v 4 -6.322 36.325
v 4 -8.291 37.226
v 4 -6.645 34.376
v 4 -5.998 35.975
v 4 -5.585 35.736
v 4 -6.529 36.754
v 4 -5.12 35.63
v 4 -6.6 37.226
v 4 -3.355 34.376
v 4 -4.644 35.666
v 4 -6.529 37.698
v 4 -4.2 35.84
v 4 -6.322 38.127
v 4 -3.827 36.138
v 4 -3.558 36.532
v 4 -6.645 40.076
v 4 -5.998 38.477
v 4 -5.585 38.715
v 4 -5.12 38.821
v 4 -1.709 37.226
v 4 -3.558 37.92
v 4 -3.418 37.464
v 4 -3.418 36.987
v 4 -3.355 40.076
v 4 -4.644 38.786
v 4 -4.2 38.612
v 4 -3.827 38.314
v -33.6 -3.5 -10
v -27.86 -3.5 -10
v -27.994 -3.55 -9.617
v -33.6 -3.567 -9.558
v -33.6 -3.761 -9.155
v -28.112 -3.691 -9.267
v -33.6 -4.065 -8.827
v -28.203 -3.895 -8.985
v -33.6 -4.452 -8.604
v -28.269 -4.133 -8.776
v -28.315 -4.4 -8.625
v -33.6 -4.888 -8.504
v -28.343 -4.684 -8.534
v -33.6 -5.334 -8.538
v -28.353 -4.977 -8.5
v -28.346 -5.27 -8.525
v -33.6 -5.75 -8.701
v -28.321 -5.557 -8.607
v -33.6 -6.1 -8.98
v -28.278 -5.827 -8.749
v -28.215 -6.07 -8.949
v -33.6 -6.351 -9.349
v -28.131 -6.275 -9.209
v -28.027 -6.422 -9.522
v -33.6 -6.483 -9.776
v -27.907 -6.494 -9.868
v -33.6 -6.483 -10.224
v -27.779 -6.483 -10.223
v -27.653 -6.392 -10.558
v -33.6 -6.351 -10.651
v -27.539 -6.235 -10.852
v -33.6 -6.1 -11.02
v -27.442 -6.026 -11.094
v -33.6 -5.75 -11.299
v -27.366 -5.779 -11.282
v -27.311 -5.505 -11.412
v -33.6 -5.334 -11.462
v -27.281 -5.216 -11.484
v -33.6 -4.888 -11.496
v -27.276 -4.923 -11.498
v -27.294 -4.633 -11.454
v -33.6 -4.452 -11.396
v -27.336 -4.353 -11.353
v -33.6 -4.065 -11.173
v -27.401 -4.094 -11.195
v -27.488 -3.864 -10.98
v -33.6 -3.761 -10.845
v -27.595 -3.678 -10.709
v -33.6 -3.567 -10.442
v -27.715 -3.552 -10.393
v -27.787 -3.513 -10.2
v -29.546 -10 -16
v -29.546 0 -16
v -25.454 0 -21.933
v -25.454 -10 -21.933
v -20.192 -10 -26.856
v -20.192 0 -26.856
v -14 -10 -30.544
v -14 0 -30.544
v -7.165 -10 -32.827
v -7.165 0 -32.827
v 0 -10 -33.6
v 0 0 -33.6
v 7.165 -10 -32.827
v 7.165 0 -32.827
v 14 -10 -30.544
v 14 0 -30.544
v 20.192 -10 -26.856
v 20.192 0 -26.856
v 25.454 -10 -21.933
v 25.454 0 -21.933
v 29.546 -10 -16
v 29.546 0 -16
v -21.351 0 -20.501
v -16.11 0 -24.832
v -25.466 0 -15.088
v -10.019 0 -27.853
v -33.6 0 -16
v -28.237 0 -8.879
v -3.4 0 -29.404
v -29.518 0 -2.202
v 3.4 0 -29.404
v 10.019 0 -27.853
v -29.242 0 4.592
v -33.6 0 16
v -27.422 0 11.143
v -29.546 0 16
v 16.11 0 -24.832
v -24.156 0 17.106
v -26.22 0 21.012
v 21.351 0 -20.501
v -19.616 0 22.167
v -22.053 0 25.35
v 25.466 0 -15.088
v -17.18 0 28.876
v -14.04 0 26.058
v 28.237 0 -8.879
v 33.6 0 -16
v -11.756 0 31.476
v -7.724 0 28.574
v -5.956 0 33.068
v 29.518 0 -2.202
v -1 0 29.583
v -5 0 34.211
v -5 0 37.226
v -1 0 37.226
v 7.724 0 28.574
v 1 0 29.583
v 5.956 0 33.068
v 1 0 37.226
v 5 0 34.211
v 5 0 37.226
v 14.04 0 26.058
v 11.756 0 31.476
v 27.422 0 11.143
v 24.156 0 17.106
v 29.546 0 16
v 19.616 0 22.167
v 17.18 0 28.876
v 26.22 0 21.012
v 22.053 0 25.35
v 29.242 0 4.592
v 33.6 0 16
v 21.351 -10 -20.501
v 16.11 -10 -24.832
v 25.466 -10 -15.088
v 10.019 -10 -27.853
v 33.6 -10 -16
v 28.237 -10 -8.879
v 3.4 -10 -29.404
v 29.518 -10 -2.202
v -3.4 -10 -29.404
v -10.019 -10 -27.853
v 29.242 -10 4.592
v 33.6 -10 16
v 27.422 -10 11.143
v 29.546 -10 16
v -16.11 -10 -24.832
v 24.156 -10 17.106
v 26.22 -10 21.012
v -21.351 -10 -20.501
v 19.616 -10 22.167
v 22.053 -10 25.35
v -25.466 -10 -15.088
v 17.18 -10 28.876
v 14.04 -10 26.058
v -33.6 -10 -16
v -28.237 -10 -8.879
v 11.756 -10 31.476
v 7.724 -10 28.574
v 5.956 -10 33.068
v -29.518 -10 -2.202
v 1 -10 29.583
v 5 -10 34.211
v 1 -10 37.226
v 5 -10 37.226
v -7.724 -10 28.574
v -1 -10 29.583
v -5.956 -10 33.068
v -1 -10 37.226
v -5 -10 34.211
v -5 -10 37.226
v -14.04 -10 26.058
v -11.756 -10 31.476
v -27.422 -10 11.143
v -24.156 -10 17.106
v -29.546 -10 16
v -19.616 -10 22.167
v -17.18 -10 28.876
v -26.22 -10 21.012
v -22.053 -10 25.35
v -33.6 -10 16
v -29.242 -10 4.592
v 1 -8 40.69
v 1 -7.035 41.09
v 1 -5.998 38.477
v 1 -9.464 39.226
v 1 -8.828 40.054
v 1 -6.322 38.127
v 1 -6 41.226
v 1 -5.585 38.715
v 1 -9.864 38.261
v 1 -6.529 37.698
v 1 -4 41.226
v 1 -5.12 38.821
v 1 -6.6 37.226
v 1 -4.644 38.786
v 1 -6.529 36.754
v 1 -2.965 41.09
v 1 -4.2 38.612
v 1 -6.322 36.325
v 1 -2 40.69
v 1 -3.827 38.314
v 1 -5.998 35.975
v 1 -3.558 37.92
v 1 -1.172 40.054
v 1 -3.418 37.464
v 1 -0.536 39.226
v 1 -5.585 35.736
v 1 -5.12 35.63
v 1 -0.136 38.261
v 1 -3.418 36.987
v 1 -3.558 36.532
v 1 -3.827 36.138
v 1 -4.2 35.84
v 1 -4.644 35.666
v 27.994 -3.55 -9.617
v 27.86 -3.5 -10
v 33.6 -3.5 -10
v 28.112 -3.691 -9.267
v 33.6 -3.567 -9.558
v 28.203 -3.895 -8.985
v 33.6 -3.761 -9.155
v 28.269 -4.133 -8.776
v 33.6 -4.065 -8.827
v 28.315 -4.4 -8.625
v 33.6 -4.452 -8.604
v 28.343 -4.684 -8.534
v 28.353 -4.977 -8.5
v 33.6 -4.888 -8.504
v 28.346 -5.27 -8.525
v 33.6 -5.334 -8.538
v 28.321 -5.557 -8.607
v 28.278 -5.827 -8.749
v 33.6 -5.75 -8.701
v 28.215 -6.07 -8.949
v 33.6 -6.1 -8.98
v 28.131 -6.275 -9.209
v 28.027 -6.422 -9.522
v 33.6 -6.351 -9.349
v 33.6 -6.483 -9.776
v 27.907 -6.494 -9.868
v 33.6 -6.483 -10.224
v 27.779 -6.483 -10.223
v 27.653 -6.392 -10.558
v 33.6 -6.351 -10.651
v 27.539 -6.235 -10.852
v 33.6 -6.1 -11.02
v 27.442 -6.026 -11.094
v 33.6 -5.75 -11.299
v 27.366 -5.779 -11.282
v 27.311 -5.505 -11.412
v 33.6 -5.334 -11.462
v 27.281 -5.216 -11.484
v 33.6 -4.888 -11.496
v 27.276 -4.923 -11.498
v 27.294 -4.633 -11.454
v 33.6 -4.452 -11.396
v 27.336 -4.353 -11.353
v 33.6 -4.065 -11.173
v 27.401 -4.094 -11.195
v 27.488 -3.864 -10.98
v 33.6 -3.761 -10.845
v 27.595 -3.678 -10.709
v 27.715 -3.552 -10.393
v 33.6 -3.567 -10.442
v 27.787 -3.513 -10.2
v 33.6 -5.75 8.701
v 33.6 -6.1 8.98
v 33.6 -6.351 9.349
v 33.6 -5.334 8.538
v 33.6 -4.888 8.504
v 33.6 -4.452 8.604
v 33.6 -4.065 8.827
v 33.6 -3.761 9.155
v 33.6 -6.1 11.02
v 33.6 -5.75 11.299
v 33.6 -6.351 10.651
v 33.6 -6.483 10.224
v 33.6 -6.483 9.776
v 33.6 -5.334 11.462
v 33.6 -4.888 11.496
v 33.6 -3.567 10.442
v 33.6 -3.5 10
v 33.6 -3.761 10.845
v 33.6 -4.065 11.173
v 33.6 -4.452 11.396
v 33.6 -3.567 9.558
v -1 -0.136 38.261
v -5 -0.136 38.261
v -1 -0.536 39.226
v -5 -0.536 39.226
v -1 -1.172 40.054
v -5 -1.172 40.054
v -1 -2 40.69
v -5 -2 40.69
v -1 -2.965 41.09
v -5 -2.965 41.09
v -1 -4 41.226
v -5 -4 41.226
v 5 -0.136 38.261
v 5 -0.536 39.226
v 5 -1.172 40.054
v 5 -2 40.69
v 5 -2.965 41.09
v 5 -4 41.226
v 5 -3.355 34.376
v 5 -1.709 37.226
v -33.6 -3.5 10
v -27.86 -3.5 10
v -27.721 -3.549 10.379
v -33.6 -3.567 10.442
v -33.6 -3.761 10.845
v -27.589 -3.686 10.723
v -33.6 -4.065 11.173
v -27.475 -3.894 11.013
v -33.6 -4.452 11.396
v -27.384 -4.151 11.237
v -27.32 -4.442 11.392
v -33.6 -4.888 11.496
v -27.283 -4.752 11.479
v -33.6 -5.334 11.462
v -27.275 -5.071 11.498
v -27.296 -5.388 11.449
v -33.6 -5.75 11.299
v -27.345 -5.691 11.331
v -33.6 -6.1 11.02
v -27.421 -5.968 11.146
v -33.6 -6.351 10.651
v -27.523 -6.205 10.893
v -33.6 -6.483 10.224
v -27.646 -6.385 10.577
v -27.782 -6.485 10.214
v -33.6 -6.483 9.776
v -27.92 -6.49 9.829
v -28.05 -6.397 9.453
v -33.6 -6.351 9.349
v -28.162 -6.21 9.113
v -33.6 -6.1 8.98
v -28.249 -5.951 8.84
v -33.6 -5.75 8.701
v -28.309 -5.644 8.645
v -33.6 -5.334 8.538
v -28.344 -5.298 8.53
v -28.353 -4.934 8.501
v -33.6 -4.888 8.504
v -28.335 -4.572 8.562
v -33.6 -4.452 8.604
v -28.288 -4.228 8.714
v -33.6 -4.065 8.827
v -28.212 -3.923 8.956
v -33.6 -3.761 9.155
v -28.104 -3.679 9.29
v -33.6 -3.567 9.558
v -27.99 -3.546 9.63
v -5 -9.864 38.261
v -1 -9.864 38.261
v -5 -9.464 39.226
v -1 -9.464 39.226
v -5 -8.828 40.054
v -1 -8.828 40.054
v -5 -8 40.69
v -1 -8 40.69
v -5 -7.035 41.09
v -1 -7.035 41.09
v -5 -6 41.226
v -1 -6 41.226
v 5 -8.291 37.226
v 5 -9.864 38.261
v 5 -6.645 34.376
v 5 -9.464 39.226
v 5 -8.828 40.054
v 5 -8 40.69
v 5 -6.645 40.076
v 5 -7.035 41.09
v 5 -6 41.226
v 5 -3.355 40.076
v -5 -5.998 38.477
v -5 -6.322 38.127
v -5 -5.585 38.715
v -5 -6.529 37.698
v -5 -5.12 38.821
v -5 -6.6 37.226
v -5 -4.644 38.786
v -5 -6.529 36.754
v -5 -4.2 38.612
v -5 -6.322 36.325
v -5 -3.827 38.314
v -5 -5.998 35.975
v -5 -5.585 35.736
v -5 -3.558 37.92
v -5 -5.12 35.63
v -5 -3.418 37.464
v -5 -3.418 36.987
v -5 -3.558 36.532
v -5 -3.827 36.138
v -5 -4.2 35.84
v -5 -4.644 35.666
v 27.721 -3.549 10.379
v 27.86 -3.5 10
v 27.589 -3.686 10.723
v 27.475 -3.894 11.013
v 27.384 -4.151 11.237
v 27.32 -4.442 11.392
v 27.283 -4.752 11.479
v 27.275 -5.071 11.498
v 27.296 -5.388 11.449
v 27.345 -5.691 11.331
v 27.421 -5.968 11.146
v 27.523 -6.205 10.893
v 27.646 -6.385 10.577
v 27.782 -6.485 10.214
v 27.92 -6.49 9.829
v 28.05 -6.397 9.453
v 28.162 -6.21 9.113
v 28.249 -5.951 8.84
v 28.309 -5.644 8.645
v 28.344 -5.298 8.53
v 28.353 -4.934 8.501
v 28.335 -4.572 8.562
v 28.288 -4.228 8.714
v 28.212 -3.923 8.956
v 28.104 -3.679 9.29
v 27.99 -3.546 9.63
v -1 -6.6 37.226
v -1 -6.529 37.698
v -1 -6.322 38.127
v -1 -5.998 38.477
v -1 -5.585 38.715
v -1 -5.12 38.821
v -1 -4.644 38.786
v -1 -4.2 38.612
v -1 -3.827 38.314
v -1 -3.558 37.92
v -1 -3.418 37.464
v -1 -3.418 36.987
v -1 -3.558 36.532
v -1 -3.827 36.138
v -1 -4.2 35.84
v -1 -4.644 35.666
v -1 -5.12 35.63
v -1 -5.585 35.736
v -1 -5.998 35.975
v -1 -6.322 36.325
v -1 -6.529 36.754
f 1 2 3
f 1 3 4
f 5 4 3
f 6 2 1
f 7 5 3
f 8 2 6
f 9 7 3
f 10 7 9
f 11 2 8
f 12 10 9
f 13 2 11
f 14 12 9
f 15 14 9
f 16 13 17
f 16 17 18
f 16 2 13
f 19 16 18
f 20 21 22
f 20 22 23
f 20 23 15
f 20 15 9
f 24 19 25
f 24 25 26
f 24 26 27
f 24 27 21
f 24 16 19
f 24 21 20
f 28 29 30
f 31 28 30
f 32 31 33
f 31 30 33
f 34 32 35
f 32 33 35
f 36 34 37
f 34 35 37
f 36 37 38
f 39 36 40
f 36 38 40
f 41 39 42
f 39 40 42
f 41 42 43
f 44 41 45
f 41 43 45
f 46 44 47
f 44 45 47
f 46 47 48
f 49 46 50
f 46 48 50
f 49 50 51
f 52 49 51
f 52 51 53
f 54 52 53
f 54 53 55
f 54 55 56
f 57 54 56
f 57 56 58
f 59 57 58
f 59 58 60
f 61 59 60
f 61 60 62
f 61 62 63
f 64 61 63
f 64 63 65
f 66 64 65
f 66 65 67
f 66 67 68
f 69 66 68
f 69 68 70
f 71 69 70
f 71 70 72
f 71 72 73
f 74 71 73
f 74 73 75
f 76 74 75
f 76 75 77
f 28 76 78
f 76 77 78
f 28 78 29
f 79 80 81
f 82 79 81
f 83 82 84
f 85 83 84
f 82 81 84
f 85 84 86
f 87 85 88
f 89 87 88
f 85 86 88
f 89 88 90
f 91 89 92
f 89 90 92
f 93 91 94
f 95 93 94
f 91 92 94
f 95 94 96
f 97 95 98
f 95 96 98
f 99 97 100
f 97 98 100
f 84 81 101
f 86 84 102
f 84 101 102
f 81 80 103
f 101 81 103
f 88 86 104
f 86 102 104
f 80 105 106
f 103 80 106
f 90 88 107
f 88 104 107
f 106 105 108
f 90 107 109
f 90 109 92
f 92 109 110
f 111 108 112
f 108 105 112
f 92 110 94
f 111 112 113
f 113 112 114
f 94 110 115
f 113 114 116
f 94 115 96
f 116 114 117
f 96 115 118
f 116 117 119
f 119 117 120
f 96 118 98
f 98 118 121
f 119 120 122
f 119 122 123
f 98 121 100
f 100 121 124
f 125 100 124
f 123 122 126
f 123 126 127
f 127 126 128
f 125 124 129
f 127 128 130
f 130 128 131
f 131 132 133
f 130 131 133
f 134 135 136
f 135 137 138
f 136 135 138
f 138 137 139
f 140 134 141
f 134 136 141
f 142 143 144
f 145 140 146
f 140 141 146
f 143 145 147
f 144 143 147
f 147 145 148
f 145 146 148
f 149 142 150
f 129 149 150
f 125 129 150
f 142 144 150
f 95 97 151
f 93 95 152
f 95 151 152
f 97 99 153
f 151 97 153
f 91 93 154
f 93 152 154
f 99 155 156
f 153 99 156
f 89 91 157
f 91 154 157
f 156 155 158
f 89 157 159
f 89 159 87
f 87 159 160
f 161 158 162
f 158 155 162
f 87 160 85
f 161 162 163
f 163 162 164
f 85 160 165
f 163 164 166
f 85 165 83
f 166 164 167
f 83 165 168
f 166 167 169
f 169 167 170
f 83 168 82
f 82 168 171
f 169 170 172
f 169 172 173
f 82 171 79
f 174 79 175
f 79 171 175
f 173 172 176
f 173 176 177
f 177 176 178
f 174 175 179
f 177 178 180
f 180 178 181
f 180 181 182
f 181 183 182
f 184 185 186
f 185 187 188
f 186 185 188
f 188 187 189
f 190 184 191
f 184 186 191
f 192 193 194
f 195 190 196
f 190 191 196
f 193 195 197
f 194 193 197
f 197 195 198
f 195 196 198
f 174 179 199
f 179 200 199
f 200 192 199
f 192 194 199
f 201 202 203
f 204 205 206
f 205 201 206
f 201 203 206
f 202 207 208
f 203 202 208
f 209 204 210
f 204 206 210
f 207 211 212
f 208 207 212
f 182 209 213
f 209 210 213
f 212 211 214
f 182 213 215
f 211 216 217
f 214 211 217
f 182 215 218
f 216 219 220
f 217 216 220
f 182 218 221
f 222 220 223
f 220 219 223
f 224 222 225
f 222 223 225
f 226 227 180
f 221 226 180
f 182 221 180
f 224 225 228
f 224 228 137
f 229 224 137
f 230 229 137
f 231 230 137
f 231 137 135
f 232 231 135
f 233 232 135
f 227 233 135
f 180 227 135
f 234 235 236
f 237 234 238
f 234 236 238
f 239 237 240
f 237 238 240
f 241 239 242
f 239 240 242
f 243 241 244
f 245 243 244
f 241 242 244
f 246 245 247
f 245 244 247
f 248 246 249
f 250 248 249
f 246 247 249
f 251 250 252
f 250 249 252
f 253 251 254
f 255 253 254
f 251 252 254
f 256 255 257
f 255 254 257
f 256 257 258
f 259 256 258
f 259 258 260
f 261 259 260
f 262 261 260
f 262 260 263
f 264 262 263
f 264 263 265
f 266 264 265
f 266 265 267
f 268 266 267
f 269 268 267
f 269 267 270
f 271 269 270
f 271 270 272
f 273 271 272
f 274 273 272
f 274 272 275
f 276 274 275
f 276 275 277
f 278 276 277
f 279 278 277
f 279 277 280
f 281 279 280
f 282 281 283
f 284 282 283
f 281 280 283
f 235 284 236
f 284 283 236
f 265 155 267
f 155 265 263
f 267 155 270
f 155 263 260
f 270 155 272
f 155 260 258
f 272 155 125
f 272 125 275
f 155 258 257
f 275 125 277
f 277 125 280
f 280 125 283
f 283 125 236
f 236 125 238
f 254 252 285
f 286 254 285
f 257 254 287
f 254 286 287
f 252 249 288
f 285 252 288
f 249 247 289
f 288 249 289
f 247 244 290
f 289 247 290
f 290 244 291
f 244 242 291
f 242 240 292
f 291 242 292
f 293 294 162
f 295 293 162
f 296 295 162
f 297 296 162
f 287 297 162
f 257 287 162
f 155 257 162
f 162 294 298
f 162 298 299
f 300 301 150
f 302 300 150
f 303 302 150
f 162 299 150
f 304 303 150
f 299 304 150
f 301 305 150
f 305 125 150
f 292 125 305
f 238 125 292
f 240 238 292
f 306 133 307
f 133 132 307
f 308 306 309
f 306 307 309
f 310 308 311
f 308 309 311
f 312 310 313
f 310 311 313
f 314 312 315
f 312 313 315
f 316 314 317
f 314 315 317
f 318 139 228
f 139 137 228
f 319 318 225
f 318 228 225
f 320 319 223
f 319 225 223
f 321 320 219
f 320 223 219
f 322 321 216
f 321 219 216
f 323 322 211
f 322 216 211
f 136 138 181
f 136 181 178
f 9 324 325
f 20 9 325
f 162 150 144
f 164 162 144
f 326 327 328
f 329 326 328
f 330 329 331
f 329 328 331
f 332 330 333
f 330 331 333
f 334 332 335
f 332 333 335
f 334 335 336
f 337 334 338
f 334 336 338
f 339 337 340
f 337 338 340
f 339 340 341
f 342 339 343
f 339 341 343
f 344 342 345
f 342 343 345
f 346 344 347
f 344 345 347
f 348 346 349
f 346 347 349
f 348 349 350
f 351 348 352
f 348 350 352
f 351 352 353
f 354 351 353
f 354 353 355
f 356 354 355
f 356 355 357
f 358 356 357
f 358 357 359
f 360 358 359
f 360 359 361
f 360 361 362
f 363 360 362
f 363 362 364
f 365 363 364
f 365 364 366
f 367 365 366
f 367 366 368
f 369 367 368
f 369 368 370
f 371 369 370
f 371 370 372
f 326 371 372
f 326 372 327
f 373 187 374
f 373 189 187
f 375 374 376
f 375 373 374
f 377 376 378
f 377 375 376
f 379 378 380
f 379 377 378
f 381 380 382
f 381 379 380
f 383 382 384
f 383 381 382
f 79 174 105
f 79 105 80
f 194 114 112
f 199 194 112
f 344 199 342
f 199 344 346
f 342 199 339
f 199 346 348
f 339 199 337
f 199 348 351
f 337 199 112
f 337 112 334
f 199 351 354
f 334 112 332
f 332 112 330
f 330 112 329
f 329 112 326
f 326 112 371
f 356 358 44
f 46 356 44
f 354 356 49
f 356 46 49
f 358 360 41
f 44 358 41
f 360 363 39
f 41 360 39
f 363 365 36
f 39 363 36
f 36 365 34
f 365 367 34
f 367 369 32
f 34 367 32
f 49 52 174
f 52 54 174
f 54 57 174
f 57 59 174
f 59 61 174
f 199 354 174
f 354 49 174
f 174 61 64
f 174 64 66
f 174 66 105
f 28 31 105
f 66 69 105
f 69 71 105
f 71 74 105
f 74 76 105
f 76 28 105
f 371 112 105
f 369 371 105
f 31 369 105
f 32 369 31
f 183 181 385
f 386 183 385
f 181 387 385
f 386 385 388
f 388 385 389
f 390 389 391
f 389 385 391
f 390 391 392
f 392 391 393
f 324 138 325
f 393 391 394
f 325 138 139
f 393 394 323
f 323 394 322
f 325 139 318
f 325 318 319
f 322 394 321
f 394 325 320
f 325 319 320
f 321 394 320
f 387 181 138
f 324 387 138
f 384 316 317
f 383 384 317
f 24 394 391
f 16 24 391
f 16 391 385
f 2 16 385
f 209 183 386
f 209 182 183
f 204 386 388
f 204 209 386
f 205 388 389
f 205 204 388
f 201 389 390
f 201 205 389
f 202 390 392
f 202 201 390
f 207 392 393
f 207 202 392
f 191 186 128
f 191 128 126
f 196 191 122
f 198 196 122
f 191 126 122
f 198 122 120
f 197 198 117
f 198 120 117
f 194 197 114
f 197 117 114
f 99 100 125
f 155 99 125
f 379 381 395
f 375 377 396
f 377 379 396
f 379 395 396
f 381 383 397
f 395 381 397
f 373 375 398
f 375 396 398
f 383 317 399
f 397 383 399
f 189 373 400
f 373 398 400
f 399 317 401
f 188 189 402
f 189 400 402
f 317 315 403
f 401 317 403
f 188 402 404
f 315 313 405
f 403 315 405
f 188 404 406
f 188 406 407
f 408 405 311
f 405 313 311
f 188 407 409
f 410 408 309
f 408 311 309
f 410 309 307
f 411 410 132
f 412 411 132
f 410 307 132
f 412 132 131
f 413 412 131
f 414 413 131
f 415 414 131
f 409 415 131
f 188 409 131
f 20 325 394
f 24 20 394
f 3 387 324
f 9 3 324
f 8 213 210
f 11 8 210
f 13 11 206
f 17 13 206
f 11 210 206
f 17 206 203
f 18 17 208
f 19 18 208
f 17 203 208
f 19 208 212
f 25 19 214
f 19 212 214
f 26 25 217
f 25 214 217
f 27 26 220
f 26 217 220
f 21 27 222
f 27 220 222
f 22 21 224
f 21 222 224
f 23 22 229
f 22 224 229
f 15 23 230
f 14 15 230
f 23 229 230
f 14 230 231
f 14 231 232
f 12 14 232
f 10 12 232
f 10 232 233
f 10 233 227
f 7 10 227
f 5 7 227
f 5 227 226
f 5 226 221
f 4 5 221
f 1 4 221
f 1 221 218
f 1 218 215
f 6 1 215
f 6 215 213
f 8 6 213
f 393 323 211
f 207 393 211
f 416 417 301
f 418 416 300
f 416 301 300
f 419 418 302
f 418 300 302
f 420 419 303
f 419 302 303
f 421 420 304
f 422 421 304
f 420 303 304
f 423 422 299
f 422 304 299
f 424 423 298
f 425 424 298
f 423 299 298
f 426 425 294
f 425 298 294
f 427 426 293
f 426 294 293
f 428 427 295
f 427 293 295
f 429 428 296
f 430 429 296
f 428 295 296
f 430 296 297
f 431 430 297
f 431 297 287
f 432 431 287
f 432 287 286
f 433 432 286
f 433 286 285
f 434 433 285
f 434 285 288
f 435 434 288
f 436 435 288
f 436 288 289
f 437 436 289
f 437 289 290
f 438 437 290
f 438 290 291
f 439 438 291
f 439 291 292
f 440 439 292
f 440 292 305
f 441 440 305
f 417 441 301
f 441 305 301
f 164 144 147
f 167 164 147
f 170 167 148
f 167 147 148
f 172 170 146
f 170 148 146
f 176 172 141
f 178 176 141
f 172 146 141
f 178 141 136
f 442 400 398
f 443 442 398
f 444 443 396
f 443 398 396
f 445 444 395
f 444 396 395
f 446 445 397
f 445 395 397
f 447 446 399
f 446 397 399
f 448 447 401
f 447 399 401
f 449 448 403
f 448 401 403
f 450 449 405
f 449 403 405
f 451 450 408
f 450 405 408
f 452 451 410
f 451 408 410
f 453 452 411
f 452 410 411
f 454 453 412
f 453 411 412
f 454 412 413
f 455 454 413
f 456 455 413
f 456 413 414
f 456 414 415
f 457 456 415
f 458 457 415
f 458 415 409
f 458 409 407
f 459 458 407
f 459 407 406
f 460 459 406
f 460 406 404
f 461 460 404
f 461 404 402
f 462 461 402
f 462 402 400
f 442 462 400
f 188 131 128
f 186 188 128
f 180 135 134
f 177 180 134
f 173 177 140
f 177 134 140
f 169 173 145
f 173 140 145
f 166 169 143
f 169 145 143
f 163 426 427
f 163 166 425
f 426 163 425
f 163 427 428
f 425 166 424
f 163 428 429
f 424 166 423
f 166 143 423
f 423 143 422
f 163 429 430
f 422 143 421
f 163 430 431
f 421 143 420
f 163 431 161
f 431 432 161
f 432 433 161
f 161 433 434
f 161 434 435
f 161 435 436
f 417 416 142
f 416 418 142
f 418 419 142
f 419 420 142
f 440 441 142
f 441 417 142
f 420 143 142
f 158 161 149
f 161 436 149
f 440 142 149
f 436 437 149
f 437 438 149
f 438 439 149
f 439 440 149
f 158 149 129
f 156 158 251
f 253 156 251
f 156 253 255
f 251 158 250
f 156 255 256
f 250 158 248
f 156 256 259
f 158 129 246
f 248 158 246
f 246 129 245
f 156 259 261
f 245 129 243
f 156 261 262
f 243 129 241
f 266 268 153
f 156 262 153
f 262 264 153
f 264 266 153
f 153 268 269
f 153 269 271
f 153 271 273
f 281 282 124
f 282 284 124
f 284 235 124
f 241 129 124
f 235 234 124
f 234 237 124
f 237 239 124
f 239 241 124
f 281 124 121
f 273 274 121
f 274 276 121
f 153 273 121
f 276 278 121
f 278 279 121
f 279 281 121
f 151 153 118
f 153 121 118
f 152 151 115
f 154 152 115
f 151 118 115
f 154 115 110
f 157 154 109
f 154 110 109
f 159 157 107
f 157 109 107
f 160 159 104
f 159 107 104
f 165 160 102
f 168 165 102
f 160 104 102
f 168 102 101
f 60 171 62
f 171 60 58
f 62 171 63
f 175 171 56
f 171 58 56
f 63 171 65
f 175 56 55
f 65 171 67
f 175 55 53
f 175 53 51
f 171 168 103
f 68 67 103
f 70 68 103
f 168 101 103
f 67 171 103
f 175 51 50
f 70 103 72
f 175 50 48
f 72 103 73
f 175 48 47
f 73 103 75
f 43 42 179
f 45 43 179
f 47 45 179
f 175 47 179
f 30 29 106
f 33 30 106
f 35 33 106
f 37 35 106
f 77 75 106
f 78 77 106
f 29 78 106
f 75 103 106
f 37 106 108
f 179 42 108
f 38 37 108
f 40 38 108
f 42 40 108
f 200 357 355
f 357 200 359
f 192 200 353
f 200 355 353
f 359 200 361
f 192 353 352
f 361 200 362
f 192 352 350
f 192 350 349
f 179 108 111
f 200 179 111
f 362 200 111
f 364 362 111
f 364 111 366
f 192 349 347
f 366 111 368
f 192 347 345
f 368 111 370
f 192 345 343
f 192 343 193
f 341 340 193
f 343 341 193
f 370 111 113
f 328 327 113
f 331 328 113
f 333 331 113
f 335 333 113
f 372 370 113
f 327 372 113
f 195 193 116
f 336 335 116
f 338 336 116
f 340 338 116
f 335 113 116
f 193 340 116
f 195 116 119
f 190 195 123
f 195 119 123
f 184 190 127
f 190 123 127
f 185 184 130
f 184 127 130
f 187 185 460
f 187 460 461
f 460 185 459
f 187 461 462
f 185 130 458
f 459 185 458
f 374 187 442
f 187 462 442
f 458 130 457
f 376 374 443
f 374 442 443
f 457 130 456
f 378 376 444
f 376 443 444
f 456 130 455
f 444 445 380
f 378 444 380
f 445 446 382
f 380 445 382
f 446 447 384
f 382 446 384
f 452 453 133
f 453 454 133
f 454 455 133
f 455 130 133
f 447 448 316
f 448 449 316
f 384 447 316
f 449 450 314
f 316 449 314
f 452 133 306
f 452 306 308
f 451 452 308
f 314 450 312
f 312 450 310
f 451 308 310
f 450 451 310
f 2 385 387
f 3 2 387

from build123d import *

# Parameters (mm, degrees)
F1_DEPTH    = 10
F2_R        = 1.5
F3_DEPTH    = 67.201
F5_DEPTH    = 1
F6_D        = 3.2
F7_R        = 4
F8_T1_DEPTH = 10


# Not quite as in the source:
# - a fillet or chamfer that OpenCascade refuses, or shapes differently, is made with other operations: its cross-section is extruded or revolved along the edge and cut away or added


with BuildPart() as f1:
    # F0 (on Front) → F1 (new body)
    with BuildSketch(Plane.XZ):
        with BuildLine():
            ThreePointArc((1, 29.5831032855), (0, -29.6), (-1, 29.5831032855))
            Line((-1, 29.5831032855), (-1, 41.225893517))
            Line((-1, 41.225893517), (-5, 41.225893517))
            Line((-5, 41.225893517), (-5, 33.225893517))
            ThreePointArc((-5, 33.225893517), (-19.3012329429, 27.503134492), (-29.5458965002, 16))
            Line((-29.5458965002, 16), (-33.6, 16))
            Line((-33.6, 16), (-33.6, -16))
            Line((-33.6, -16), (-29.5458965002, -16))
            ThreePointArc((-29.5458965002, -16), (0, -33.6), (29.5458965002, -16))
            Line((29.5458965002, -16), (33.6, -16))
            Line((33.6, -16), (33.6, 16))
            Line((33.6, 16), (29.5458965002, 16))
            ThreePointArc((29.5458965002, 16), (19.3012329429, 27.503134492), (5, 33.225893517))
            Line((5, 33.225893517), (5, 41.225893517))
            Line((5, 41.225893517), (1, 41.225893517))
            Line((1, 41.225893517), (1, 29.5831032855))
        make_face()
    extrude(amount=F1_DEPTH)

    # F2 (on face) → F3 (cut, through all)
    with BuildSketch(Plane.YZ.offset(33.6)):
        with Locations((-5, 10)):
            Circle(F2_R)
        with Locations((-5, -10)):
            Circle(F2_R)
    extrude(amount=-F3_DEPTH, mode=Mode.SUBTRACT)

    # F4 (on face) → F5 (cut)
    with BuildSketch(Plane.YZ.offset(5)):
        Polygon((-1.7091034656, 37.225893517), (-3.3545517328, 40.075893517), (-6.6454482672, 40.075893517), (-8.2908965344, 37.225893517), (-6.6454482672, 34.375893517), (-3.3545517328, 34.375893517), align=None)
    extrude(amount=-F5_DEPTH, mode=Mode.SUBTRACT)

    # F6 (through all)
    with Locations(Plane.YZ.offset(5)):
        with Locations((-5, 37.225893517)):
            Hole(F6_D / 2)

    # F7
    f7_edges = [f1.edges().sort_by_distance(p)[0] for p in [
        (3, 0, 41.225894),
        (3, -10, 41.225894),
        (-3, -10, 41.225894),
        (-3, 0, 41.225894),
    ]]
    fillet(f7_edges, radius=F7_R)

    # F8: chamfer of 1 on 2 edges, made by hand

    # F8_s2 → F8_t1 (join)
    with BuildSketch(Plane.XZ):
        with BuildLine():
            Line((4.9743446923, 34.2419704201), (5.9814730887, 33.0372447854))
            Line((5.9814730887, 33.0372447854), (5.977927959, 33.0175614916))
            ThreePointArc((5.977927959, 33.0175614916), (5.4901701774, 33.1281516451), (4.9970238095, 33.2061161994))
            Line((4.9970238095, 33.2061161994), (4.98, 33.225893517))
            ThreePointArc((4.98, 33.225893517), (4.98, 33.7339319685), (4.9543446923, 34.2419704201))
            Line((4.9543446923, 34.2419704201), (4.9743446923, 34.2419704201))
        make_face()
        with BuildLine():
            Line((-4.9743446923, 34.2419704201), (-5.9814730887, 33.0372447854))
            Line((-5.9814730887, 33.0372447854), (-5.977927959, 33.0175614916))
            ThreePointArc((-5.977927959, 33.0175614916), (-5.4901701774, 33.1281516451), (-4.9970238095, 33.2061161994))
            Line((-4.9970238095, 33.2061161994), (-4.98, 33.225893517))
            ThreePointArc((-4.98, 33.225893517), (-4.98, 33.7339319685), (-4.9543446923, 34.2419704201))
            Line((-4.9543446923, 34.2419704201), (-4.9743446923, 34.2419704201))
        make_face()
    extrude(amount=F8_T1_DEPTH)


solid = f1.part
